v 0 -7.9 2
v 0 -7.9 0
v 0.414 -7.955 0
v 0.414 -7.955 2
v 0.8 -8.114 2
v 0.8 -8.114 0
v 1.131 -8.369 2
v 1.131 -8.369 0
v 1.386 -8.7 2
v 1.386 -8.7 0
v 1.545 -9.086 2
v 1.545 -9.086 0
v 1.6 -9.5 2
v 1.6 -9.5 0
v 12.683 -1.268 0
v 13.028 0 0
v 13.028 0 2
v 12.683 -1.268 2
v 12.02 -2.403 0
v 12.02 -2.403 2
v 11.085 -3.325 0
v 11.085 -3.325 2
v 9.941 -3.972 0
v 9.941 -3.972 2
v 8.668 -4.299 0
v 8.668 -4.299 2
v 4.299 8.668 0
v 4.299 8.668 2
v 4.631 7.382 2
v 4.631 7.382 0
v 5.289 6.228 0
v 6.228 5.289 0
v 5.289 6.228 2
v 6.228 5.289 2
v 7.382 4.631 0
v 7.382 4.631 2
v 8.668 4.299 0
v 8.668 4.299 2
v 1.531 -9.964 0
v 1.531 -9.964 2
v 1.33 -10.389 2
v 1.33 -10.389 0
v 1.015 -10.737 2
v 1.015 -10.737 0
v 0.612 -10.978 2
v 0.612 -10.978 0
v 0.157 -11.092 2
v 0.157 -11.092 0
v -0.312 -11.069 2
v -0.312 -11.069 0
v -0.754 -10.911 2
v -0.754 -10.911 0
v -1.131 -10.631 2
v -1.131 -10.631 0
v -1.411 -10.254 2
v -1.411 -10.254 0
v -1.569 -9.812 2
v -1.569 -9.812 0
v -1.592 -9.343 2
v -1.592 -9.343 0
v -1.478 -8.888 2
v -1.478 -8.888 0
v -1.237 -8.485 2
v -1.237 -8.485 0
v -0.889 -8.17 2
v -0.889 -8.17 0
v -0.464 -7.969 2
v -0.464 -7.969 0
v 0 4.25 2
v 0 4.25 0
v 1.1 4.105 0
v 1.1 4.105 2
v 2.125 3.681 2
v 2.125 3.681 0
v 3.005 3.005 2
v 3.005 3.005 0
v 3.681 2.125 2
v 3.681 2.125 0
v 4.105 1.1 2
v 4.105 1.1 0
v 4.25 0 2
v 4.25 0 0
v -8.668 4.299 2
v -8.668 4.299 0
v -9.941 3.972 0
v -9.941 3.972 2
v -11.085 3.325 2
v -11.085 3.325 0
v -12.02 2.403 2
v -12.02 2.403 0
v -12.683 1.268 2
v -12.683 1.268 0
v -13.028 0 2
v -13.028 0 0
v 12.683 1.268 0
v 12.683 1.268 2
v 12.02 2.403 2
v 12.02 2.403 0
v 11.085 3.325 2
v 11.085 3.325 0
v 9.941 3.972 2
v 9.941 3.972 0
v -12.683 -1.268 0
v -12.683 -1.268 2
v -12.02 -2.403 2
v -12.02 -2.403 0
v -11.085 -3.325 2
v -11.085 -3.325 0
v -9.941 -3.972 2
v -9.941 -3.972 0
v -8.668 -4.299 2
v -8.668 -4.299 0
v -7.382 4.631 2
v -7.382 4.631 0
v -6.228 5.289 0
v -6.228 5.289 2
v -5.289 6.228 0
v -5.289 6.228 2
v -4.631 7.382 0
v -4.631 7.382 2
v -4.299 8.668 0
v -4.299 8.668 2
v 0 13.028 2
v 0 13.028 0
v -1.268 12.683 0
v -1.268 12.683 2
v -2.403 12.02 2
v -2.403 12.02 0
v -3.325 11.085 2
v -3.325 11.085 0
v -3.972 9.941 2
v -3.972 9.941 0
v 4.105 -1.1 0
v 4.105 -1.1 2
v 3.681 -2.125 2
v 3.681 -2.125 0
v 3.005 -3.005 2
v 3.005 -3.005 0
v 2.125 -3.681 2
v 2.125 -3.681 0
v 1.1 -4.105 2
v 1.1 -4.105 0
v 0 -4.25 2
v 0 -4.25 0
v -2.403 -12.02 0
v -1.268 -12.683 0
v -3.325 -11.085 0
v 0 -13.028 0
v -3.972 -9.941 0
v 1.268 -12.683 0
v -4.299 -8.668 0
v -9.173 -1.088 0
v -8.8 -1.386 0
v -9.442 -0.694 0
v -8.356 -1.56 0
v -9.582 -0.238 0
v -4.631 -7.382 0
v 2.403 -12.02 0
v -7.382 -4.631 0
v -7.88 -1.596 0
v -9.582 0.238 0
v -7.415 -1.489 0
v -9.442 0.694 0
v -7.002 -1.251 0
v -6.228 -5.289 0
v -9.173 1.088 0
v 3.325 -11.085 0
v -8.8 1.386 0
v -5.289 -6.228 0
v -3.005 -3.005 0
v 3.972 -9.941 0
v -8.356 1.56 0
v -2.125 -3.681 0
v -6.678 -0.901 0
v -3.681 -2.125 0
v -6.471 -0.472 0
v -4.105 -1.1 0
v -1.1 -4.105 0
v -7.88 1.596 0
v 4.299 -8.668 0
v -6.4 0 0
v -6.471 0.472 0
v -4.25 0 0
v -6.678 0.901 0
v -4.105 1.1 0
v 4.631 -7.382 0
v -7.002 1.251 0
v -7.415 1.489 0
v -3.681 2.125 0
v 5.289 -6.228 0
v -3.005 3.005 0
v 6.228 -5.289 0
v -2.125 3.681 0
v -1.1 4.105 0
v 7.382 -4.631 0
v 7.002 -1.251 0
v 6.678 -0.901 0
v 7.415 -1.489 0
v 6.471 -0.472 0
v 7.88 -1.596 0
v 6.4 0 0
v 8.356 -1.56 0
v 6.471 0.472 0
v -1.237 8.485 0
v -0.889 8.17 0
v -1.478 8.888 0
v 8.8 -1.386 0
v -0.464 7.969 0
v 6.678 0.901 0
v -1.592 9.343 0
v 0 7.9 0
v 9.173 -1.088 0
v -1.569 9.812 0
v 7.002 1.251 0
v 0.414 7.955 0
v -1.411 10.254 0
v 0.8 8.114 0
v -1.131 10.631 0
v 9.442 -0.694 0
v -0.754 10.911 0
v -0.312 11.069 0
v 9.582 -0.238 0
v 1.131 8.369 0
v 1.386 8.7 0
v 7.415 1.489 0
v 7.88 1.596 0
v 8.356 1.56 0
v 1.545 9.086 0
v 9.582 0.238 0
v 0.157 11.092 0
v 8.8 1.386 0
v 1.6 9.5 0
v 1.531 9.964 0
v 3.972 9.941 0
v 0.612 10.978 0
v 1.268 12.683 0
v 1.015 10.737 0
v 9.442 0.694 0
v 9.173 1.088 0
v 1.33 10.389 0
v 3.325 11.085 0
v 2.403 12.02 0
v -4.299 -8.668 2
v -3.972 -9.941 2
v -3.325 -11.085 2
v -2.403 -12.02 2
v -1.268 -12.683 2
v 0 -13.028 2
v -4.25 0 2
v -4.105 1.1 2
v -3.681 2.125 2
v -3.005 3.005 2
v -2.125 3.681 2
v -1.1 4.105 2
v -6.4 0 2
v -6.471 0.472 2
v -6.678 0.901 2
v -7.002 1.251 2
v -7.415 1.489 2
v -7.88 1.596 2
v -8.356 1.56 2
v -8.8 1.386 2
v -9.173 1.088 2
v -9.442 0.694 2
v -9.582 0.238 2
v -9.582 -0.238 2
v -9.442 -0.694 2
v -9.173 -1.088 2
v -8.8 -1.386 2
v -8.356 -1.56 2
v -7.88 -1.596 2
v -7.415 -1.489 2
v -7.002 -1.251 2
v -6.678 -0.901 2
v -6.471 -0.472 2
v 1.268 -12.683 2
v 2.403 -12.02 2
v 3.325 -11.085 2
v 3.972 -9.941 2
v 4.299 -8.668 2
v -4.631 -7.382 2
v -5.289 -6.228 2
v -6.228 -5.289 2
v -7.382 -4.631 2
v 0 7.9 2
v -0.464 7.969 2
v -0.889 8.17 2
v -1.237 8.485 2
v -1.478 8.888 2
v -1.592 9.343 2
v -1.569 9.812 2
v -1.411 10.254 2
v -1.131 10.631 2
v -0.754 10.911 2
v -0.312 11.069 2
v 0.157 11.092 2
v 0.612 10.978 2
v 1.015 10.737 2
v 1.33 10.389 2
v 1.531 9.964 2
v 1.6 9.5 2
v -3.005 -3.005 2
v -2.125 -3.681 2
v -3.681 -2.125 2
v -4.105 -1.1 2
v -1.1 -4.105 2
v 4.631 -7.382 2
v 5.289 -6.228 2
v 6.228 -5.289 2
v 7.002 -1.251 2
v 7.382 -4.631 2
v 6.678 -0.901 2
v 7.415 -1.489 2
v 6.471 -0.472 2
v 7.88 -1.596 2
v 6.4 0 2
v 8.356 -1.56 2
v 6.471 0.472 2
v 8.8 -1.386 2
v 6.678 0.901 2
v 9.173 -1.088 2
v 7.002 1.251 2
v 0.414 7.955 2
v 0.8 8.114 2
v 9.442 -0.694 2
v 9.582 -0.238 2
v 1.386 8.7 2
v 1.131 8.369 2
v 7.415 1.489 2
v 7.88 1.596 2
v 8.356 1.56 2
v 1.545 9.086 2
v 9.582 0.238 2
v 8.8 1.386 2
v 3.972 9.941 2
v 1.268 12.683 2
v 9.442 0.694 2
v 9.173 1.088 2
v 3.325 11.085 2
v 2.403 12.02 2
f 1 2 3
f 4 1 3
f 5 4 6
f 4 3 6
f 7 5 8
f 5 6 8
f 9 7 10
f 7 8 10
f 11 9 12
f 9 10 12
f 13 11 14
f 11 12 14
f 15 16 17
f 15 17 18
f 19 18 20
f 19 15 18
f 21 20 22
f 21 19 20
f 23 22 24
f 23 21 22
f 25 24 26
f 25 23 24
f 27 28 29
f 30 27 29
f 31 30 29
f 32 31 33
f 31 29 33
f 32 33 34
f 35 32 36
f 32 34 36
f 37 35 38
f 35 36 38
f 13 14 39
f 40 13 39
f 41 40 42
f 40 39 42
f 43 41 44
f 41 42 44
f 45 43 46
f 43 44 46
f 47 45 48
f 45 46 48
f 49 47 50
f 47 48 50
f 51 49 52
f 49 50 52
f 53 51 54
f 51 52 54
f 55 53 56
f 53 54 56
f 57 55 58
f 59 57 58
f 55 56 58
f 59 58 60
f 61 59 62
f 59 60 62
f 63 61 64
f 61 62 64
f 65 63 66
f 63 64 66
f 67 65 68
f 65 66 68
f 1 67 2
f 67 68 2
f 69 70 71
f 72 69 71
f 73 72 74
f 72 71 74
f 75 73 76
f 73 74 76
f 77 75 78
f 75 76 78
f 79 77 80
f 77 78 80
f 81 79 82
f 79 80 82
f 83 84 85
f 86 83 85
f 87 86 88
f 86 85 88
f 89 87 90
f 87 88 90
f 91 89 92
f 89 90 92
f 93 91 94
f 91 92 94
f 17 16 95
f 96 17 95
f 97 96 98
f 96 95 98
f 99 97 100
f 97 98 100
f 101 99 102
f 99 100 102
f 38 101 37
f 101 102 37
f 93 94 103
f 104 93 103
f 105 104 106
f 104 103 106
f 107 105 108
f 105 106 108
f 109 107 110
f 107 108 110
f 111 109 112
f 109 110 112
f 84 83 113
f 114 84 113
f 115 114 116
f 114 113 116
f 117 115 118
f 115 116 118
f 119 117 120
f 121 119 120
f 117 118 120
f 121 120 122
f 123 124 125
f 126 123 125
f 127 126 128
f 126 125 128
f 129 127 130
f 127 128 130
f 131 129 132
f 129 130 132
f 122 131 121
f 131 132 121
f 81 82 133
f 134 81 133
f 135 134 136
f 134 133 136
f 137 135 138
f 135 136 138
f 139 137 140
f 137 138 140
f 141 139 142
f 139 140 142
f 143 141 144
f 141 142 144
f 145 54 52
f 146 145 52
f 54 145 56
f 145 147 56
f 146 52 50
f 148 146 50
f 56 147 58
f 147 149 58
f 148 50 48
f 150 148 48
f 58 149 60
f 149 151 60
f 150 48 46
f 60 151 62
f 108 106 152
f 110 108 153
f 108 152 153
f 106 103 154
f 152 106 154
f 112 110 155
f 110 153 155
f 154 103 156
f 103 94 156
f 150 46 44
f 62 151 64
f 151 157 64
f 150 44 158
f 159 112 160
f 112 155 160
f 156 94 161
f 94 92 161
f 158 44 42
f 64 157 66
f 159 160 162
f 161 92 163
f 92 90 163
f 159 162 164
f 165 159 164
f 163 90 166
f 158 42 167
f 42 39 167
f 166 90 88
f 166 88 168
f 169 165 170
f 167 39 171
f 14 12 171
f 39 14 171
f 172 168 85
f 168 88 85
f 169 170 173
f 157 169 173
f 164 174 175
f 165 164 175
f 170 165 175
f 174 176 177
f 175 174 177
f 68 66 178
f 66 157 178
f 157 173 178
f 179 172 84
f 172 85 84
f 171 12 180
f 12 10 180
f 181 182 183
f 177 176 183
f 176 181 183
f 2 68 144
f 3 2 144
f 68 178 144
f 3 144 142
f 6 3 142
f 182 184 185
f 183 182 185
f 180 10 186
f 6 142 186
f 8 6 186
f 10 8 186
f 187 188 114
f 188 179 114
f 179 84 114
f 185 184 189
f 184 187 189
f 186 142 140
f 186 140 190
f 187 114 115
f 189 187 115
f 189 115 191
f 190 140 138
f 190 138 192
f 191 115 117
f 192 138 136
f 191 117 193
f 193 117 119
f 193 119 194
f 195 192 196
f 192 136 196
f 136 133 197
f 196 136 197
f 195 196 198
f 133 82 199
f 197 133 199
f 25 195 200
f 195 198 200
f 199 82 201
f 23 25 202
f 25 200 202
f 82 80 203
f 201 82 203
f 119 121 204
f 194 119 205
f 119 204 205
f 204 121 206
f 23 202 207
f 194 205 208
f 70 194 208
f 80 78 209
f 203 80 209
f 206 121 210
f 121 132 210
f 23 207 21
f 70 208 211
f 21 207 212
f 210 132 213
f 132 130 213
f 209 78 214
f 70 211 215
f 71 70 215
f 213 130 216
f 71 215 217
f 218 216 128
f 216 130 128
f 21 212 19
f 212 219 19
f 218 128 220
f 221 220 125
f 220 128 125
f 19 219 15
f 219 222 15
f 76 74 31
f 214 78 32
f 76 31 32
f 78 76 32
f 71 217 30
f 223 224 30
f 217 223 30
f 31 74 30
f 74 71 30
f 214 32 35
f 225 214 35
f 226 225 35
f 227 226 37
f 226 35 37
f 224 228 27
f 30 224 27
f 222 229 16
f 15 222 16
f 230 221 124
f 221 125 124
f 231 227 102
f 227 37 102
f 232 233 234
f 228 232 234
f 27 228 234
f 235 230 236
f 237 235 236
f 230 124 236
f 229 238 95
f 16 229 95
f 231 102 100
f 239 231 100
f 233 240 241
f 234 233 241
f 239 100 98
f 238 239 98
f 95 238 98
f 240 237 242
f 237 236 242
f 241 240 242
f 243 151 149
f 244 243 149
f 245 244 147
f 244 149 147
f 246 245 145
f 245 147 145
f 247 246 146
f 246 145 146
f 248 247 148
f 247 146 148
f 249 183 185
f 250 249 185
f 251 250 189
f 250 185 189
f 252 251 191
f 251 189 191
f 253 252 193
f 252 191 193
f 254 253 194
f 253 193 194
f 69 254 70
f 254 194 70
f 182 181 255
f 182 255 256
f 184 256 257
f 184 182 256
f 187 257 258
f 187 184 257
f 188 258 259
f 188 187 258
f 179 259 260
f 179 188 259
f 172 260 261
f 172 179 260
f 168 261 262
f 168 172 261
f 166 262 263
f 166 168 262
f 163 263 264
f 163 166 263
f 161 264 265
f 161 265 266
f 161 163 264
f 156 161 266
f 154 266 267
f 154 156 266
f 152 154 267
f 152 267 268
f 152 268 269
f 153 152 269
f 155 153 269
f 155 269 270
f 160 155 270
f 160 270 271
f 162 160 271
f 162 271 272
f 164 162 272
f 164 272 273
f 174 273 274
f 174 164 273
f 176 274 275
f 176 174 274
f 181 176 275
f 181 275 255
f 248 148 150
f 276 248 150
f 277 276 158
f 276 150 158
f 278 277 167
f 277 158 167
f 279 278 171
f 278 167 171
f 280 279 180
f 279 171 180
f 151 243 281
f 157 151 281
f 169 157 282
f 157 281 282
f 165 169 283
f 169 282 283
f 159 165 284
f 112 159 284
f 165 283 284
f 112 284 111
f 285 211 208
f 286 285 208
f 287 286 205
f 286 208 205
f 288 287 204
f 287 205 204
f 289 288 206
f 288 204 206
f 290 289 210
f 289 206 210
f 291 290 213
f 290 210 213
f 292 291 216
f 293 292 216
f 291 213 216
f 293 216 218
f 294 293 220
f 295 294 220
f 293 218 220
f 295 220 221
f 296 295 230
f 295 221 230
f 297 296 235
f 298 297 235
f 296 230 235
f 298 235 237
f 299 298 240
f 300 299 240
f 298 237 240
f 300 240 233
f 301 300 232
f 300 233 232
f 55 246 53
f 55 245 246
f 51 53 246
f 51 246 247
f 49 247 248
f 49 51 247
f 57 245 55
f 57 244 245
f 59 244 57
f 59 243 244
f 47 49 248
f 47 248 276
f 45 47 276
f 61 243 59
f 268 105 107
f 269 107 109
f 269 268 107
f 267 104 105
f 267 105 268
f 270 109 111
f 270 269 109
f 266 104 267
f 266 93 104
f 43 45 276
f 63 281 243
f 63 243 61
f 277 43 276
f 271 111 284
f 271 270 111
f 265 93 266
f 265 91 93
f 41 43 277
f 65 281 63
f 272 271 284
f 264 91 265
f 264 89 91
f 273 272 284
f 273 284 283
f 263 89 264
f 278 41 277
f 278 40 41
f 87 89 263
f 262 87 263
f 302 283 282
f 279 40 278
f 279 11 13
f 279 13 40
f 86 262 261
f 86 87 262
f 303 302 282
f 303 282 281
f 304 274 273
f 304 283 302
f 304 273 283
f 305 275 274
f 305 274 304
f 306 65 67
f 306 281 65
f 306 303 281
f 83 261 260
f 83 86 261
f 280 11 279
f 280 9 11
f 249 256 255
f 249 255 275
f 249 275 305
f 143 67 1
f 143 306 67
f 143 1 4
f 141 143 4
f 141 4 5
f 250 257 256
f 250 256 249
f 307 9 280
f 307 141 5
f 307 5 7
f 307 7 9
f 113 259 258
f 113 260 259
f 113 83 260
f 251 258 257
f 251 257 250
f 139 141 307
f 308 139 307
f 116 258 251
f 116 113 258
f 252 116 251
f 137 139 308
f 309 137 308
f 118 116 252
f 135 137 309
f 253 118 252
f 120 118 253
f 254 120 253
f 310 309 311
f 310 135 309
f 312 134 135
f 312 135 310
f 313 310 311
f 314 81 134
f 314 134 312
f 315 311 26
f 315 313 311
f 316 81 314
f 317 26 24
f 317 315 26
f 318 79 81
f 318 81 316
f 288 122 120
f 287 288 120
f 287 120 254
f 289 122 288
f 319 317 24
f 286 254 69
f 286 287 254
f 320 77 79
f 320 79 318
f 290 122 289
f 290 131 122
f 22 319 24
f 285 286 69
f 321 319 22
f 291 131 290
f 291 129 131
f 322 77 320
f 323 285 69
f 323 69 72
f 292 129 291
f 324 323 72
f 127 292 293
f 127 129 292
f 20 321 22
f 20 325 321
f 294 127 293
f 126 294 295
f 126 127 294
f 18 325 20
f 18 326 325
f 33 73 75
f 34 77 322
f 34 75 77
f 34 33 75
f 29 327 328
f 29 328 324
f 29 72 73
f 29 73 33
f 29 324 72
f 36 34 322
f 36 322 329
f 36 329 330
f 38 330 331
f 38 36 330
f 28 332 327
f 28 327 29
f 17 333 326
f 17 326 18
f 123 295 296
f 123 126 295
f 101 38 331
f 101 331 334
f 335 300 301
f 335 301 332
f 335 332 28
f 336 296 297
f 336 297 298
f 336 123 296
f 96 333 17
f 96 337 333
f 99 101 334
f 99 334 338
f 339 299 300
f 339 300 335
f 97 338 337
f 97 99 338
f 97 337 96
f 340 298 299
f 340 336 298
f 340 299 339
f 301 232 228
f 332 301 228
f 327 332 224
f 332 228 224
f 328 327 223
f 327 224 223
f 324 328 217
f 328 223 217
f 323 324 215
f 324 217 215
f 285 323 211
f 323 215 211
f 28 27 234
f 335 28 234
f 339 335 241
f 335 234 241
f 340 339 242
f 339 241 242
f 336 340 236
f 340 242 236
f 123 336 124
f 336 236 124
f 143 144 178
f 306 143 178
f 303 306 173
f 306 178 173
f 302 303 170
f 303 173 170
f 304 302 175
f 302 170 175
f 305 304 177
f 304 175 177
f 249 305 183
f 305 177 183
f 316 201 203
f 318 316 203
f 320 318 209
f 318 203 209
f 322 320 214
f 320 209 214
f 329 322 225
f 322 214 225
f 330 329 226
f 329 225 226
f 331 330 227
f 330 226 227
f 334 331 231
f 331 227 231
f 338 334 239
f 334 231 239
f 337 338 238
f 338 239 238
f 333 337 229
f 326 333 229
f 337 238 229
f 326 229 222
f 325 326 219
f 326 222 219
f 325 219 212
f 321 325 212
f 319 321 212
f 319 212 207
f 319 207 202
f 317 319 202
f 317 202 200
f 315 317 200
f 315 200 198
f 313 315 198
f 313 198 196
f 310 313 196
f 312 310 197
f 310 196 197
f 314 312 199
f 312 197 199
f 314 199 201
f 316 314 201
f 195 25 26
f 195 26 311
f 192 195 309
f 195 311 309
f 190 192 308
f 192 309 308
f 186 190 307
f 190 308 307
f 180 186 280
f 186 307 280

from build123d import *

# Parameters (mm, degrees)
F1_R        = 13.1
F1_R_2      = 1.6
F2_DEPTH    = 2
F3_R        = 5
F4_DEPTH    = 25
F5_T1_DEPTH = 33.3713058975


# Not quite as in the source:
# - a fillet or chamfer that OpenCascade refuses, or shapes differently, is made with other operations: its cross-section is extruded or revolved along the edge and cut away or added


with BuildPart() as f2:
    # F1 (on Top) → F2 (new body)
    with BuildSketch(Plane.XY):
        Circle(F1_R)
        with BuildLine():
            ThreePointArc((1.6, -9.5), (-1.1313708499, -10.6313708499), (0, -7.9))
            ThreePointArc((0, -7.9), (1.1313708499, -8.3686291501), (1.6, -9.5))
        make_face(mode=Mode.SUBTRACT)
        with Locations((-8, 0)):
            Circle(F1_R_2, mode=Mode.SUBTRACT)
        with BuildLine():
            ThreePointArc((-4.25, 0), (-3.00520382, 3.00520382), (0, 4.25))
            ThreePointArc((0, 4.25), (3.00520382, 3.00520382), (4.25, 0))
            ThreePointArc((4.25, 0), (3.00520382, -3.00520382), (0, -4.25))
            ThreePointArc((0, -4.25), (-3.00520382, -3.00520382), (-4.25, 0))
        make_face(mode=Mode.SUBTRACT)
        with BuildLine():
            ThreePointArc((9.6, 0), (8, -1.6), (6.4, 0))
            ThreePointArc((6.4, 0), (8, 1.6), (9.6, 0))
        make_face(mode=Mode.SUBTRACT)
        with BuildLine():
            ThreePointArc((1.6, 9.5), (1.1313708499, 8.3686291501), (0, 7.9))
            ThreePointArc((0, 7.9), (-1.1313708499, 10.6313708499), (1.6, 9.5))
        make_face(mode=Mode.SUBTRACT)
    extrude(amount=F2_DEPTH)

    # F3 (on face) → F4 (cut)
    with BuildSketch(Plane.XY.offset(2)):
        with Locations((-9.2630988335, 9.2630988335)):
            Circle(F3_R)
        with Locations((9.2630988335, -9.2630988335)):
            Circle(F3_R)
        with Locations((-9.2630988335, -9.2630988335)):
            Circle(F3_R)
        with Locations((9.2630988335, 9.2630988335)):
            Circle(F3_R)
    extrude(amount=-F4_DEPTH, mode=Mode.SUBTRACT)

    # F5: fillet of radius 5 on 8 edges, made by hand

    # F5_s2 → F5_t1 (cut)
    with BuildSketch(Plane.XY.offset(-15.6856529487)):
        with BuildLine():
            ThreePointArc((1.0767599787, 13.0556726348), (-2.4959833234, 11.9459923629), (-4.298657973, 8.667845155))
            ThreePointArc((-4.298657973, 8.667845155), (-4.4028928152, 10.437150561), (-5.1178235319, 12.0589337131))
            ThreePointArc((-5.1178235319, 12.0589337131), (-2.0810864422, 12.9336413751), (1.0767599787, 13.0556726348))
        make_face()
        with BuildLine():
            ThreePointArc((-8.667845155, 4.298657973), (-11.9459923629, 2.4959833234), (-13.0556726348, -1.0767599787))
            ThreePointArc((-13.0556726348, -1.0767599787), (-12.9336413751, 2.0810864422), (-12.0589337131, 5.1178235319))
            ThreePointArc((-12.0589337131, 5.1178235319), (-10.437150561, 4.4028928152), (-8.667845155, 4.298657973))
        make_face()
        with BuildLine():
            ThreePointArc((13.0556726348, -1.0767599787), (11.9459923629, 2.4959833234), (8.667845155, 4.298657973))
            ThreePointArc((8.667845155, 4.298657973), (10.437150561, 4.4028928152), (12.0589337131, 5.1178235319))
            ThreePointArc((12.0589337131, 5.1178235319), (12.9336413751, 2.0810864422), (13.0556726348, -1.0767599787))
        make_face()
        with BuildLine():
            ThreePointArc((4.298657973, 8.667845155), (2.4959833234, 11.9459923629), (-1.0767599787, 13.0556726348))
            ThreePointArc((-1.0767599787, 13.0556726348), (2.0810864422, 12.9336413751), (5.1178235319, 12.0589337131))
            ThreePointArc((5.1178235319, 12.0589337131), (4.4028928152, 10.437150561), (4.298657973, 8.667845155))
        make_face()
        with BuildLine():
            ThreePointArc((13.0556726348, 1.0767599787), (11.9459923629, -2.4959833234), (8.667845155, -4.298657973))
            ThreePointArc((8.667845155, -4.298657973), (10.437150561, -4.4028928152), (12.0589337131, -5.1178235319))
            ThreePointArc((12.0589337131, -5.1178235319), (12.9336413751, -2.0810864422), (13.0556726348, 1.0767599787))
        make_face()
        with BuildLine():
            ThreePointArc((-1.0767599787, -13.0556726348), (2.4959833234, -11.9459923629), (4.298657973, -8.667845155))
            ThreePointArc((4.298657973, -8.667845155), (4.4028928152, -10.437150561), (5.1178235319, -12.0589337131))
            ThreePointArc((5.1178235319, -12.0589337131), (2.0810864422, -12.9336413751), (-1.0767599787, -13.0556726348))
        make_face()
        with BuildLine():
            ThreePointArc((-13.0556726348, 1.0767599787), (-11.9459923629, -2.4959833234), (-8.667845155, -4.298657973))
            ThreePointArc((-8.667845155, -4.298657973), (-10.437150561, -4.4028928152), (-12.0589337131, -5.1178235319))
            ThreePointArc((-12.0589337131, -5.1178235319), (-12.9336413751, -2.0810864422), (-13.0556726348, 1.0767599787))
        make_face()
        with BuildLine():
            ThreePointArc((-4.298657973, -8.667845155), (-2.4959833234, -11.9459923629), (1.0767599787, -13.0556726348))
            ThreePointArc((1.0767599787, -13.0556726348), (-2.0810864422, -12.9336413751), (-5.1178235319, -12.0589337131))
            ThreePointArc((-5.1178235319, -12.0589337131), (-4.4028928152, -10.437150561), (-4.298657973, -8.667845155))
        make_face()
    extrude(amount=F5_T1_DEPTH, mode=Mode.SUBTRACT)


solid = f2.part
